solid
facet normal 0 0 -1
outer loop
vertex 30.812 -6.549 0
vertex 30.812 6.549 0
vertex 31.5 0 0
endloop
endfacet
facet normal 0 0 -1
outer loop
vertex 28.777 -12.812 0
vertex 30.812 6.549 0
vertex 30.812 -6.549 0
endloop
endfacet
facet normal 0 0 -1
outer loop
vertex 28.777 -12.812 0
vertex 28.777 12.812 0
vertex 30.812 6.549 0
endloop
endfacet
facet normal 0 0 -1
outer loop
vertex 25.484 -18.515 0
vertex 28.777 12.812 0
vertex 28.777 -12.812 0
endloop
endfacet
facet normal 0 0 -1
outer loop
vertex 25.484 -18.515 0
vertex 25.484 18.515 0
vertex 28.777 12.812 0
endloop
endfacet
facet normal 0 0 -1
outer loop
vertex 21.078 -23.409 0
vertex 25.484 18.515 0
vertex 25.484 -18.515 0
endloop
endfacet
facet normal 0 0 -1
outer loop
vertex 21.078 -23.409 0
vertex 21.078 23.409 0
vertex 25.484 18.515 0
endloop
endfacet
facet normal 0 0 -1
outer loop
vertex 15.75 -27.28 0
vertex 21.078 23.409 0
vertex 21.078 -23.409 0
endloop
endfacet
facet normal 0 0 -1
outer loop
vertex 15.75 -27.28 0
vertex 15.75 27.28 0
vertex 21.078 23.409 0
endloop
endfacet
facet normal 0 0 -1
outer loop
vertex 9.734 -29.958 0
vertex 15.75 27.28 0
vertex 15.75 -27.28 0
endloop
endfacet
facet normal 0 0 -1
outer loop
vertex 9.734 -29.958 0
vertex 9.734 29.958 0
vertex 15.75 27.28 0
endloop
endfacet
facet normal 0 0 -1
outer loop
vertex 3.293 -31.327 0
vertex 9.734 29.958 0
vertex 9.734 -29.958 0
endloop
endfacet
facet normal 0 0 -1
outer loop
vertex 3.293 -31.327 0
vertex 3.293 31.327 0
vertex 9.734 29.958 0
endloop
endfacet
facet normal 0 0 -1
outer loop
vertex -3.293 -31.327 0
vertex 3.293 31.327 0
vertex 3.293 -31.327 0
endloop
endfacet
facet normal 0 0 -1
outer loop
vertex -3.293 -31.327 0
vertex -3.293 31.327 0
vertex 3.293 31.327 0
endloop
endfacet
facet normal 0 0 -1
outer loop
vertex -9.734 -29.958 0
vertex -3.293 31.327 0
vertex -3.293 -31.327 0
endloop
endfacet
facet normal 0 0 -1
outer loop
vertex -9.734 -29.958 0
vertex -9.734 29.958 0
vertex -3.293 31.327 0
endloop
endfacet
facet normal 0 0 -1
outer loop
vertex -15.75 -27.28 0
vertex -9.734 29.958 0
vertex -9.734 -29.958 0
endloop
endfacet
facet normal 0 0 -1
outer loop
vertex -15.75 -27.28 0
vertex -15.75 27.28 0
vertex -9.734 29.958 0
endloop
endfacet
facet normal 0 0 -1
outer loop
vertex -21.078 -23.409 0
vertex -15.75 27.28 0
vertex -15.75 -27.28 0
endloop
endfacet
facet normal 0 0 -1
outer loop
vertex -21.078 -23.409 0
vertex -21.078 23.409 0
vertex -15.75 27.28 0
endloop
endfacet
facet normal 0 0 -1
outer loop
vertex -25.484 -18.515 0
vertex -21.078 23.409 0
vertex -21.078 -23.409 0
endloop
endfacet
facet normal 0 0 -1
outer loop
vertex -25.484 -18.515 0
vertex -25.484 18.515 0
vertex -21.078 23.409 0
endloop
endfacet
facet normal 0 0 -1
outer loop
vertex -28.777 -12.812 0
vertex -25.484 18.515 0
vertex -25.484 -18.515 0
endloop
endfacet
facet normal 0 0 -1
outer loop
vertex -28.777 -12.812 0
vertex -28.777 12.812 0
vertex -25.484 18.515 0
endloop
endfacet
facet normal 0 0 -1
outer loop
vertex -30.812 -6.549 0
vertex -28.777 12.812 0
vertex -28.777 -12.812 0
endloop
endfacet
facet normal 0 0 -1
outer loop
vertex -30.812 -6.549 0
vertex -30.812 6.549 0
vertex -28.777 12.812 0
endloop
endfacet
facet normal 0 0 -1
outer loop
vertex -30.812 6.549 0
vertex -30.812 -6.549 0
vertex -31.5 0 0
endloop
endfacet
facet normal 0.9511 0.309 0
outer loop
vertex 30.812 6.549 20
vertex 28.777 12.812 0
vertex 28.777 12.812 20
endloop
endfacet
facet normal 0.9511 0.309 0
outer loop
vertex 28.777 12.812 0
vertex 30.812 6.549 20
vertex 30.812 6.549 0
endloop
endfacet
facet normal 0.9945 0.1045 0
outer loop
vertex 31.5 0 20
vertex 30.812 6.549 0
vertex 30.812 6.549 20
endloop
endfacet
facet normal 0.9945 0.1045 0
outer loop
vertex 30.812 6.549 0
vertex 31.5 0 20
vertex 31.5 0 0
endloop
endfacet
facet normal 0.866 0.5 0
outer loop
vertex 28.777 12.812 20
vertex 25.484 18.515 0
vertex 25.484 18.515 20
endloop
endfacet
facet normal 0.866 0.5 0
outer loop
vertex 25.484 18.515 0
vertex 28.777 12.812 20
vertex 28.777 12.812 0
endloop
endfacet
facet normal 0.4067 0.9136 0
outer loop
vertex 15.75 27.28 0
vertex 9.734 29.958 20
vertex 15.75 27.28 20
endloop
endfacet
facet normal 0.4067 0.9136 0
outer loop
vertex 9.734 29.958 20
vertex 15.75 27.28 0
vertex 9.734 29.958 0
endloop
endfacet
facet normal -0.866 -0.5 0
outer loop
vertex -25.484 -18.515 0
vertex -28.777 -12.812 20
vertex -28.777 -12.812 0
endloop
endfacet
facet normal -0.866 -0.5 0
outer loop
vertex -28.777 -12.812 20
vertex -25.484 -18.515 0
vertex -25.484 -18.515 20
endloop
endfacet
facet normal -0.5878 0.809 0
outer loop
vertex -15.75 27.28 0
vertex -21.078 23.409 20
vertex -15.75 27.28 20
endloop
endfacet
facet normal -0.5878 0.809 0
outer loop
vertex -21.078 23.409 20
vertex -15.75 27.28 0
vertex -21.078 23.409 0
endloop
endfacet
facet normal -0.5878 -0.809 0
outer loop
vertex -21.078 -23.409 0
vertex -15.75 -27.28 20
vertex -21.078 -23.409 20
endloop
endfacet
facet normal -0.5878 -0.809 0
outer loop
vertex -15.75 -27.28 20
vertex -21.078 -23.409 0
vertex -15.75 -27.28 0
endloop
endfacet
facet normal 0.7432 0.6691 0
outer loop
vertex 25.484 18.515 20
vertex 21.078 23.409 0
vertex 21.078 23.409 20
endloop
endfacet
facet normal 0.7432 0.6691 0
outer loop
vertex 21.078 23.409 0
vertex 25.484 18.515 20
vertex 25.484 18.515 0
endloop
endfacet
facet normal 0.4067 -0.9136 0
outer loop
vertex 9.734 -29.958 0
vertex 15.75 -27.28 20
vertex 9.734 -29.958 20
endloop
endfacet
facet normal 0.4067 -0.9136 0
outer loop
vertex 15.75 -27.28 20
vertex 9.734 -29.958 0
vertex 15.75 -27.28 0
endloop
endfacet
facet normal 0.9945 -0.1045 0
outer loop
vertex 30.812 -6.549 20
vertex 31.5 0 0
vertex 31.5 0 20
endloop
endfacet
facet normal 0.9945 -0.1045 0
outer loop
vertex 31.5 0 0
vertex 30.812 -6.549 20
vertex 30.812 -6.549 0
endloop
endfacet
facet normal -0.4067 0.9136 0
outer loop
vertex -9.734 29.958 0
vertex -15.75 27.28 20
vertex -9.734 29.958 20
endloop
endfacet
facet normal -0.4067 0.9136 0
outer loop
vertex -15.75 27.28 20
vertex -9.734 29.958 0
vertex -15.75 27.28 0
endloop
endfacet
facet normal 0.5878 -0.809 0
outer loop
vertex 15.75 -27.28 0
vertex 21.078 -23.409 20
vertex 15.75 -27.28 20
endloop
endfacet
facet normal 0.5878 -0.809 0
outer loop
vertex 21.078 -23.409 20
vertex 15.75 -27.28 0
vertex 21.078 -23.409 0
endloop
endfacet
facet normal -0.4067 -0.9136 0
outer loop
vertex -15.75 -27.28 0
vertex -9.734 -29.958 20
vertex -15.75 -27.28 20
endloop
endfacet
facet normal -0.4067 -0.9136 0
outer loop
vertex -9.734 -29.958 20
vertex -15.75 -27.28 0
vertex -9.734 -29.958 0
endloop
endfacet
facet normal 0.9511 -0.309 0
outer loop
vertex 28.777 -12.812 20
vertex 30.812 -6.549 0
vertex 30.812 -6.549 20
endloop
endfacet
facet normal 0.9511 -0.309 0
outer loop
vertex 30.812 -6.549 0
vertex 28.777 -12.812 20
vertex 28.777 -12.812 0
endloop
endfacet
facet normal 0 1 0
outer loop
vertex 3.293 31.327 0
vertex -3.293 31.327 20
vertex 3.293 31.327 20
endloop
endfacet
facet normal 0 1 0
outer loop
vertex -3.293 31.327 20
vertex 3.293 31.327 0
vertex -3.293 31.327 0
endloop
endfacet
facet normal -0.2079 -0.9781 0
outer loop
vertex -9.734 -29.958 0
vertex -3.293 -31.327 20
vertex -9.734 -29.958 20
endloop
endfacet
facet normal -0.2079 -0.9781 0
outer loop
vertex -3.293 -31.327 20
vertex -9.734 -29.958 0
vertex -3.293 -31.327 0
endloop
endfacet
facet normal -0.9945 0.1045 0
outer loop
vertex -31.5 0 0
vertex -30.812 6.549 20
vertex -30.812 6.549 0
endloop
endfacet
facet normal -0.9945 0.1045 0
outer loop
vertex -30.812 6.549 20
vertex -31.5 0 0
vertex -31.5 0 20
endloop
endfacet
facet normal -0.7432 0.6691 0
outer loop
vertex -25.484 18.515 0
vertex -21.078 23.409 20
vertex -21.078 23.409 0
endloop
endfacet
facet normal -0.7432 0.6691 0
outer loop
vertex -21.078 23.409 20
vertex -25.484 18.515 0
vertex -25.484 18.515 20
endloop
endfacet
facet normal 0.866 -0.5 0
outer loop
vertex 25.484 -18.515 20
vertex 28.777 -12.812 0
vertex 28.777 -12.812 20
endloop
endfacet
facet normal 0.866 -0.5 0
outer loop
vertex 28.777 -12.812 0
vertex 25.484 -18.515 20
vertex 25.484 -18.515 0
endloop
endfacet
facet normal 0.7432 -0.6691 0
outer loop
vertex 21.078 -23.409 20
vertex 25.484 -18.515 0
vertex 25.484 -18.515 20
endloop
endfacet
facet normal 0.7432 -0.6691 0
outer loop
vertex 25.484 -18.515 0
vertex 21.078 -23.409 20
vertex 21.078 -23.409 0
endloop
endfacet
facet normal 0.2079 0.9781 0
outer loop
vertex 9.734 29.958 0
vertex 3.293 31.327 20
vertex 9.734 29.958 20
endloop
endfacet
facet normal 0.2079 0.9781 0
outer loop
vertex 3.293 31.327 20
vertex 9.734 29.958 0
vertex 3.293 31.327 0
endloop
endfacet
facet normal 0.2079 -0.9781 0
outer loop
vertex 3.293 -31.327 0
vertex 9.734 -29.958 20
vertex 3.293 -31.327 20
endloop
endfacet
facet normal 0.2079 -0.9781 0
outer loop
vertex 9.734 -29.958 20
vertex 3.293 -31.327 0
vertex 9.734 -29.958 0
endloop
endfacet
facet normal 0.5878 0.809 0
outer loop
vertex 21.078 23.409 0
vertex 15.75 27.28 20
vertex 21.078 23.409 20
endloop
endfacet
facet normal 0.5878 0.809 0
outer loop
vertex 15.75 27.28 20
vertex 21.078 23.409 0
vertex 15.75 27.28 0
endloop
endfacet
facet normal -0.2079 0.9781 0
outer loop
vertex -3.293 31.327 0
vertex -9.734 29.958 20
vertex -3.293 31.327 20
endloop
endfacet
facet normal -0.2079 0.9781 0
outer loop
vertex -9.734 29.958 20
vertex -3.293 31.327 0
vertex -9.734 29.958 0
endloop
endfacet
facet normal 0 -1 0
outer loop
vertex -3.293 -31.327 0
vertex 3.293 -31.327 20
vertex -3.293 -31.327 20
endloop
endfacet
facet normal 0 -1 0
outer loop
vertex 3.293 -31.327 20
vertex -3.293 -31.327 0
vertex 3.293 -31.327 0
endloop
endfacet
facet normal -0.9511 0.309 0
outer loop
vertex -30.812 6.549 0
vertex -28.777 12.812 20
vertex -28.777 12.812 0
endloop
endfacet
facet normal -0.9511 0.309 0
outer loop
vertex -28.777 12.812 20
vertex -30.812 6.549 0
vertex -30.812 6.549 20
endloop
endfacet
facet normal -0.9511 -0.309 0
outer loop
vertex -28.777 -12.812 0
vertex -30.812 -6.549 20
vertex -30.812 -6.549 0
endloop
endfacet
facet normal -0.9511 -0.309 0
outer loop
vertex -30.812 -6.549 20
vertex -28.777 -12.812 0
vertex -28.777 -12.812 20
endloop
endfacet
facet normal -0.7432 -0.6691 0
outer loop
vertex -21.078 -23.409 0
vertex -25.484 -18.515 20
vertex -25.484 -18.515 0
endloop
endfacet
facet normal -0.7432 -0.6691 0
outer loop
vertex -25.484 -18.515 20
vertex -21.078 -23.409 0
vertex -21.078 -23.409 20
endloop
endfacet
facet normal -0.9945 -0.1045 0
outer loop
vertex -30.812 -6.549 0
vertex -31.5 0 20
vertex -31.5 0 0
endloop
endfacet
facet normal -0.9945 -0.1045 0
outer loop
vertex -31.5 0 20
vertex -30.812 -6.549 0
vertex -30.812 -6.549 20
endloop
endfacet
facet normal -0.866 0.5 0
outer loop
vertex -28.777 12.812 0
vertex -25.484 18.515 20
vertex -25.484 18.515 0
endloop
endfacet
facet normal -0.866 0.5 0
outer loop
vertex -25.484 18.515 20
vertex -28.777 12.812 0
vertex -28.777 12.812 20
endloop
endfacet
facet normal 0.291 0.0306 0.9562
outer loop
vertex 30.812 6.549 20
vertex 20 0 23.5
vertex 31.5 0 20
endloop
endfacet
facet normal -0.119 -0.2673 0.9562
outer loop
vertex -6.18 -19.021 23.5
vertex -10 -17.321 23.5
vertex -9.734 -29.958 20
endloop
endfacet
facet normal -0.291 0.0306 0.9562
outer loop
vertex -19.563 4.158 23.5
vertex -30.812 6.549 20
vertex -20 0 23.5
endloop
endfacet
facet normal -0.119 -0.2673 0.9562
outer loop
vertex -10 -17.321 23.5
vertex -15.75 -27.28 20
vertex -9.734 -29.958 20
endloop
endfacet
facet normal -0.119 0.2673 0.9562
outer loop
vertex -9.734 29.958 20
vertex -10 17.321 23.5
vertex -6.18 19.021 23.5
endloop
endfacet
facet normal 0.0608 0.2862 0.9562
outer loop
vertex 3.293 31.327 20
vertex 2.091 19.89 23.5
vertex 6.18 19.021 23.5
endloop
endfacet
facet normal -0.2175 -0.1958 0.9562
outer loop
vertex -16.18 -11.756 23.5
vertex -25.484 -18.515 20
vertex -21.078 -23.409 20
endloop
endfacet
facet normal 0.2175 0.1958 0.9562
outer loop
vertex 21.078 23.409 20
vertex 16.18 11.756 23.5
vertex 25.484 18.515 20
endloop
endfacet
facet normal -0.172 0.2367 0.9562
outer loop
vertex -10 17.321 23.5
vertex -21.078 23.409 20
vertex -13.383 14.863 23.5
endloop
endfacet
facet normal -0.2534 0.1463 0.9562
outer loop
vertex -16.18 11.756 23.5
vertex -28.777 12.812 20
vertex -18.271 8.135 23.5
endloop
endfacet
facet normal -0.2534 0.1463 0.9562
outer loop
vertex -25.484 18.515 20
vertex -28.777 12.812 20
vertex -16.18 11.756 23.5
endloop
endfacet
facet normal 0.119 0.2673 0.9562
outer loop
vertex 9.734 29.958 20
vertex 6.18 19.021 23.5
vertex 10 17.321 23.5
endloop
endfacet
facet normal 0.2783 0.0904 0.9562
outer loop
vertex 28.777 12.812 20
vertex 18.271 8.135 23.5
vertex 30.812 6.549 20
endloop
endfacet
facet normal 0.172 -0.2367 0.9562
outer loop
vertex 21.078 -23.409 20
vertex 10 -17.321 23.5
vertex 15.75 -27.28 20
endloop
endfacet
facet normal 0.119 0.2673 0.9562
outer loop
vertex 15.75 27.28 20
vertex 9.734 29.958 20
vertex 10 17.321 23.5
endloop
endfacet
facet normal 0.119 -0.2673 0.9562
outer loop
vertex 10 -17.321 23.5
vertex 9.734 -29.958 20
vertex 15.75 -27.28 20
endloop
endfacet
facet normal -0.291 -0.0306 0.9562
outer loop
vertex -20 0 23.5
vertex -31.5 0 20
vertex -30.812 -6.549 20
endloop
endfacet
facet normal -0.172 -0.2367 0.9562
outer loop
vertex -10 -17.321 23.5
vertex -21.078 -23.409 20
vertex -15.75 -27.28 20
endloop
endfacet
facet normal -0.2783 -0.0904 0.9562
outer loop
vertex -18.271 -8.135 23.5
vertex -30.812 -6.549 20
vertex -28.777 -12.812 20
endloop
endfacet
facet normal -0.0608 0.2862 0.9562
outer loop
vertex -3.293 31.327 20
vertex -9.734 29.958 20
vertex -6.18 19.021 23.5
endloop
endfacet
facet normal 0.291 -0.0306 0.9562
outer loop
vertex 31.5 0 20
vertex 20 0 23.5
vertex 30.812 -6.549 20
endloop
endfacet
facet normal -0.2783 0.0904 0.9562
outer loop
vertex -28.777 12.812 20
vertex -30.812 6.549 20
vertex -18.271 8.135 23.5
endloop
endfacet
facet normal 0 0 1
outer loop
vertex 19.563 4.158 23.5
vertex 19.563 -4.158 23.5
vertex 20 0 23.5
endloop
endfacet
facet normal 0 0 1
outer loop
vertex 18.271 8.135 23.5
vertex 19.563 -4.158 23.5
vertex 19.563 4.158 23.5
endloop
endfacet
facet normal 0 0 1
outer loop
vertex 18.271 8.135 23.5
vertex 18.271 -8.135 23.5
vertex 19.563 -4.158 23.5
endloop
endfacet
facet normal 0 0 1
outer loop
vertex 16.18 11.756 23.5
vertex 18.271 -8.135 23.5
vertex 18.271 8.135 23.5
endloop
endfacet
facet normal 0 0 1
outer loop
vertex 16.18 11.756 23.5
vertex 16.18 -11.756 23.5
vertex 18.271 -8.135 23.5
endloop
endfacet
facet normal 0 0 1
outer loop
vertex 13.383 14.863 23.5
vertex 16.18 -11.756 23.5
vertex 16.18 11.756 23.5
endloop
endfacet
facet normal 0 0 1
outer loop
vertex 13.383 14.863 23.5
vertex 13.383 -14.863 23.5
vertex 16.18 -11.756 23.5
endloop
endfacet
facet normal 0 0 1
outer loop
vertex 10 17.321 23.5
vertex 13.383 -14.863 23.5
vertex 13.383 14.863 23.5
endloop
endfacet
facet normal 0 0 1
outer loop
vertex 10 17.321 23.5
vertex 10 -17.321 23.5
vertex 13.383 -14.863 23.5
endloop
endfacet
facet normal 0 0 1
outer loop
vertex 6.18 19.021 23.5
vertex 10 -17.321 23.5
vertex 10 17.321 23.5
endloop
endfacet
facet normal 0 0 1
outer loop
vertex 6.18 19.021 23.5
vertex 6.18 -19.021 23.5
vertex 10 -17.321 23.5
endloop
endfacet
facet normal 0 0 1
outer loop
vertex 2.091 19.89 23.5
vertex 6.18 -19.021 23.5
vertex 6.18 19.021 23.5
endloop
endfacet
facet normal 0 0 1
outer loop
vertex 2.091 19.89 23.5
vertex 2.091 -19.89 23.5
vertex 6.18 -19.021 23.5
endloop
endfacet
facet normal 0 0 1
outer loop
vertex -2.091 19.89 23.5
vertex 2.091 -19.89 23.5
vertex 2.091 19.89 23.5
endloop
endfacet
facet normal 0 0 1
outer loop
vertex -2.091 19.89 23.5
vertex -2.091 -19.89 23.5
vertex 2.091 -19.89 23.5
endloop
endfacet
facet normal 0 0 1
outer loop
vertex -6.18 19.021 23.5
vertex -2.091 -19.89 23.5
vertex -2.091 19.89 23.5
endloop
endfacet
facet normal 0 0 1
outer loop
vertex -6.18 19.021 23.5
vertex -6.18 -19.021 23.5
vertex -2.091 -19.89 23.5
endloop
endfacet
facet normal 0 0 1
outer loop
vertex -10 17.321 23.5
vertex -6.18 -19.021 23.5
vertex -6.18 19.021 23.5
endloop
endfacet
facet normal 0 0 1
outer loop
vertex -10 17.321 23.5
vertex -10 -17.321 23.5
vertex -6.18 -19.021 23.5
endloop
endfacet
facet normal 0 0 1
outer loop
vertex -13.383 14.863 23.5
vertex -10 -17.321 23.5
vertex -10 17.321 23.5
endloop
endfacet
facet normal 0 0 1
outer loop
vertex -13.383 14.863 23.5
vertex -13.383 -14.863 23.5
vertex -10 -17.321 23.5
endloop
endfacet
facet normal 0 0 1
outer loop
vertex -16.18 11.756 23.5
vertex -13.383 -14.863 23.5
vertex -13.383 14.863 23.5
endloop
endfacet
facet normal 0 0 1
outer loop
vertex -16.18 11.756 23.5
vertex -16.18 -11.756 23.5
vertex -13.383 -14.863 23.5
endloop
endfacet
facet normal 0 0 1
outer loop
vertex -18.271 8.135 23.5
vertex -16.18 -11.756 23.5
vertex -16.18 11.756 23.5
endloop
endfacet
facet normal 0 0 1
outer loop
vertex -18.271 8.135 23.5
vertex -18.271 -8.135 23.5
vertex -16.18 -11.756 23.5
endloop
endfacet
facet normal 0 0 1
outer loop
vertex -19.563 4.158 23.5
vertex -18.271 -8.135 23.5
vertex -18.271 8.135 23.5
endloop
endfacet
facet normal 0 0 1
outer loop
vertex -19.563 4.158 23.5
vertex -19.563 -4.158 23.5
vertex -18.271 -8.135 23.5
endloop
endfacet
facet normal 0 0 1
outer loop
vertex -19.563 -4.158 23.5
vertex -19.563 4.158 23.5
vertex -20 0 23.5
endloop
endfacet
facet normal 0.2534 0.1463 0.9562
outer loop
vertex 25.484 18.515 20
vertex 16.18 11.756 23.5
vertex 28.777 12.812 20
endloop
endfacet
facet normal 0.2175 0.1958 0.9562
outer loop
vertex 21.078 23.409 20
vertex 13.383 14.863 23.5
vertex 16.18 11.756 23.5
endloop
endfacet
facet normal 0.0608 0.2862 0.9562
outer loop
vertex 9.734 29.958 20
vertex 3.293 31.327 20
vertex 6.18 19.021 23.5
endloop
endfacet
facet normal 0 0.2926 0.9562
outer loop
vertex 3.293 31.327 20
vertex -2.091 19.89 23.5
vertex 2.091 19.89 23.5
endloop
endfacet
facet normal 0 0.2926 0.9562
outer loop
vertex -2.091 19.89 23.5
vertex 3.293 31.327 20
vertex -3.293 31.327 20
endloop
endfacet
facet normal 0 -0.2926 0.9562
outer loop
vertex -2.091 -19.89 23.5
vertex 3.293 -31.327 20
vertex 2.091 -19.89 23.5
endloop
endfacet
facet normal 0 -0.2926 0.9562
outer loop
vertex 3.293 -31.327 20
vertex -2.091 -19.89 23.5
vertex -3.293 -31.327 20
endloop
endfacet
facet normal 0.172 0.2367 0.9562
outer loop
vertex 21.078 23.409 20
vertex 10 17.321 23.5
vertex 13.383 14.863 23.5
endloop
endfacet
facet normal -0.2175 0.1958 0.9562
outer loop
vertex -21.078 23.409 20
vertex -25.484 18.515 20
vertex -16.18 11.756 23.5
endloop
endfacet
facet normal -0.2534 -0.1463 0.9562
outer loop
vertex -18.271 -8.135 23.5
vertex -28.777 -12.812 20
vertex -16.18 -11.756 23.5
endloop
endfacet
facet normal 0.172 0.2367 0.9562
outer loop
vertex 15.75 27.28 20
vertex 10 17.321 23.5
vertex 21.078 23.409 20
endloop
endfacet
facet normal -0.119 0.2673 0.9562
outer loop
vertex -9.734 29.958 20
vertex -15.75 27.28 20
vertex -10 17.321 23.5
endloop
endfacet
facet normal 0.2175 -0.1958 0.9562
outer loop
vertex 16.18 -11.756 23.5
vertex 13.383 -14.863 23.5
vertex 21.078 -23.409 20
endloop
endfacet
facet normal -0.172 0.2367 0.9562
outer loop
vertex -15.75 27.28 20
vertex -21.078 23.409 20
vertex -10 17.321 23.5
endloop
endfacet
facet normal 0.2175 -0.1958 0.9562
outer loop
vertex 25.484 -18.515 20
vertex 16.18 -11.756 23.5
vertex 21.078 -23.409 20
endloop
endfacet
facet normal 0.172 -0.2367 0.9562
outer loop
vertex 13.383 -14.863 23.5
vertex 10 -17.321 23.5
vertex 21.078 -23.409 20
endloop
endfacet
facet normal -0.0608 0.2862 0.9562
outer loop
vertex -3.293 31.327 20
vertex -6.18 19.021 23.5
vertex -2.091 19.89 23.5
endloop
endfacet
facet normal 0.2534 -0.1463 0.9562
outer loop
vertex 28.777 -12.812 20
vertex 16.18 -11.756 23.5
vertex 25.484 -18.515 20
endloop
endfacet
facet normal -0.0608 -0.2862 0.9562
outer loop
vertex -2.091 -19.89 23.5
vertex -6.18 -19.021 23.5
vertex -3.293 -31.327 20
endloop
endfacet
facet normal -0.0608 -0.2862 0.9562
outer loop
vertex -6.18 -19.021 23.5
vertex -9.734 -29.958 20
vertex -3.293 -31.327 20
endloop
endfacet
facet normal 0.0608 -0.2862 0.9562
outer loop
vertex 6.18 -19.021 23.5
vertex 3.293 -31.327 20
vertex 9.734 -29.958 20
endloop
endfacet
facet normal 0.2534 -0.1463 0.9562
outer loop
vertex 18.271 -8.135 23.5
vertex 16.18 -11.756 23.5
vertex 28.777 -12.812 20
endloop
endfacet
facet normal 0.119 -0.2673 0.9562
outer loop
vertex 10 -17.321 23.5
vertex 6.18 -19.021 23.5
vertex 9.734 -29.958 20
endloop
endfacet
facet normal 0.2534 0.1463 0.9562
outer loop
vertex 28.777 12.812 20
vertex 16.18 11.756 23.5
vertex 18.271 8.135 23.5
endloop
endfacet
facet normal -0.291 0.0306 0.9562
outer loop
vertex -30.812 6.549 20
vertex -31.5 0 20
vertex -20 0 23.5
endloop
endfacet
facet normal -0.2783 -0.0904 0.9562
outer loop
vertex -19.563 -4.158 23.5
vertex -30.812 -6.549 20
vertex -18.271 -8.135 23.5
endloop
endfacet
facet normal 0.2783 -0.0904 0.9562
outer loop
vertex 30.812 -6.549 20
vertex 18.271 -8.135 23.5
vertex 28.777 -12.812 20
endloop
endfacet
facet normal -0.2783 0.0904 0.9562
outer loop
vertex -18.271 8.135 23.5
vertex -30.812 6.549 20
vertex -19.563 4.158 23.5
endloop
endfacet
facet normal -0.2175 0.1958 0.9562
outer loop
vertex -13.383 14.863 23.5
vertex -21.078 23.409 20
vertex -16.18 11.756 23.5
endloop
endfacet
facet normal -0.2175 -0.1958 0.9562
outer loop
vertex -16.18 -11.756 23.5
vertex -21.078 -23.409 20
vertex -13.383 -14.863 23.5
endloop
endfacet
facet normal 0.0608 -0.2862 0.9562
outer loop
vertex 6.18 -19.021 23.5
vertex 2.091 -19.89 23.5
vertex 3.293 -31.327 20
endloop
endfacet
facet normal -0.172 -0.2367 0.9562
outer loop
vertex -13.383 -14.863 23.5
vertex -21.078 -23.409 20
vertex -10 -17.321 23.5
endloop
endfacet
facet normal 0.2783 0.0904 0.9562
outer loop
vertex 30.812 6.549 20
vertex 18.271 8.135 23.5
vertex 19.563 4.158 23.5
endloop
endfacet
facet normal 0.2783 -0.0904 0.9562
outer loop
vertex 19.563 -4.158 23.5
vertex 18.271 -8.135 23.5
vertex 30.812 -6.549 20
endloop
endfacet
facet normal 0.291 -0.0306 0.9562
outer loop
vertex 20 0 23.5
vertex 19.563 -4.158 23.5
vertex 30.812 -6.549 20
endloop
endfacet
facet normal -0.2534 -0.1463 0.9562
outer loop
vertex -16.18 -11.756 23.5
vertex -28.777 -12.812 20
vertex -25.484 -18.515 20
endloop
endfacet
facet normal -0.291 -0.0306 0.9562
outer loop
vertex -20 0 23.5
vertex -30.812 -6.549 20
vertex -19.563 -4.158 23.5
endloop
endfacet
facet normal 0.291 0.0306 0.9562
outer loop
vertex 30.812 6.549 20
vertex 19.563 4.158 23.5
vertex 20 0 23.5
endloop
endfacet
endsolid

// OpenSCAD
gimbal();

module standard_servo(){
    color("blue") cube([42, 20, 40]);
    color("white") translate([10, 10, 40]) cylinder(h=7, d1=4, d2=4, $fn=20);
    color("white") translate([10, 10, 45]) cylinder(h=2, d1=20, d2=20, $fn=20);
}

module servo_cage(w){
    translate([-w, -w, -w]) cube([w * 2, 20 + w * 2, w]);
    translate([10-w/2, -w, -w]) cube([w, 20 + w * 2, w]);
    translate([42-w, -w, -w]) cube([w * 2, 20 + w * 2, w]);
    translate([42, -w, -w]) cube([w, 20 + w * 2, w * 2]);
    translate([42, -w, 40 - w]) cube([w, 20 + w * 2, w * 2]);
    translate([42-w, -w, 40]) cube([w * 2, 20 + w * 2, w]);
    translate([-w, -w, 40]) cube([w * 2, 20 + w * 2, w]);
    translate([-w, -w, 40 - w]) cube([w, 20 + w * 2, w * 2]);
    translate([-w, -w, -w]) cube([w, 20 + w * 2, w * 2]);
    
    translate([0, -w, -w]) cube([42 + w, w, w*2]);
    translate([0, -w, 40-w]) cube([42 + w, w, w*2]);
    translate([-w, -w, 0]) cube([w* 2, w, 40]);
    translate([42-w, -w, 0]) cube([w* 2, w, 40]);
    
    translate([0, 20, -w]) cube([42 + w, w, w*2]);
    translate([0, 20, 40-w]) cube([42 + w, w, w*2]);
    translate([-w, 20, 0]) cube([w* 2, w, 40]);
    translate([42-w, 20, 0]) cube([w* 2, w, 40]);    
}

module 9g_motor(){
	difference(){			
		union(){
			color("blue") cube([23,12.5,22], center=true);
			color("blue") translate([0,0,5]) cube([32,12,2], center=true);
			color("blue") translate([5.5,0,2.75]) cylinder(r=6, h=25.75, $fn=20, center=true);
			color("blue") translate([-.5,0,2.75]) cylinder(r=1, h=25.75, $fn=20, center=true);
			color("blue") translate([-1,0,2.75]) cube([5,5.6,24.5], center=true);		
			color("white") translate([5.5,0,3.65]) cylinder(r=2.35, h=29.25, $fn=20, center=true);
		}
		translate([10,0,-11]) rotate([0,-30,0]) cube([8,13,4], center=true);
		for ( hole = [14,-14] ){
			translate([hole,0,5]) cylinder(r=2.2, h=4, $fn=20, center=true);
		}	
	}
}

module motor37()
{
    cylinder(h=30, d1 = 35, d2 = 35);
    
    translate([0, 0, 30])
        cylinder(h = 20, d1 = 37, d2 = 37);
    
    translate([0, 0, 50])
        cylinder(h = 7, d1 = 12, d2 = 12);
    
    translate([0, 0, 57])
        cylinder(h = 15, d1 = 6, d2 = 6);
    
    translate([0, 0, -1])
        cylinder(h = 1, d1 = 12, d2 = 12);
    
    translate([12, -3, -6])
        cube([1, 6, 6]);
    
    translate([-13, -3, -6])
        cube([1, 6, 6]);    
}

module motor25()
{
    cylinder(h=54, d1 = 25, d2 = 25);
    
    translate([0, 0, 54])
        cylinder(h = 2.5, d1 = 7, d2 = 7);
    
    translate([0, 0, 56])
        cylinder(h = 8, d1 = 4, d2 = 4);
    
    translate([0, 0, -1])
        cylinder(h = 1, d1 = 7, d2 = 7);
    
    translate([8, 0, -5])
        cube([3, 1, 5]);
    
    translate([-11, 0, -5])
        cube([3, 1, 5]);      
}

module gimbal()
{
    cylinder(h = 20, d1 = 63, d2 = 63);
    translate([0, 0, 20])
        cylinder(h = 3.5, d1 = 63, d2 = 40);
}
